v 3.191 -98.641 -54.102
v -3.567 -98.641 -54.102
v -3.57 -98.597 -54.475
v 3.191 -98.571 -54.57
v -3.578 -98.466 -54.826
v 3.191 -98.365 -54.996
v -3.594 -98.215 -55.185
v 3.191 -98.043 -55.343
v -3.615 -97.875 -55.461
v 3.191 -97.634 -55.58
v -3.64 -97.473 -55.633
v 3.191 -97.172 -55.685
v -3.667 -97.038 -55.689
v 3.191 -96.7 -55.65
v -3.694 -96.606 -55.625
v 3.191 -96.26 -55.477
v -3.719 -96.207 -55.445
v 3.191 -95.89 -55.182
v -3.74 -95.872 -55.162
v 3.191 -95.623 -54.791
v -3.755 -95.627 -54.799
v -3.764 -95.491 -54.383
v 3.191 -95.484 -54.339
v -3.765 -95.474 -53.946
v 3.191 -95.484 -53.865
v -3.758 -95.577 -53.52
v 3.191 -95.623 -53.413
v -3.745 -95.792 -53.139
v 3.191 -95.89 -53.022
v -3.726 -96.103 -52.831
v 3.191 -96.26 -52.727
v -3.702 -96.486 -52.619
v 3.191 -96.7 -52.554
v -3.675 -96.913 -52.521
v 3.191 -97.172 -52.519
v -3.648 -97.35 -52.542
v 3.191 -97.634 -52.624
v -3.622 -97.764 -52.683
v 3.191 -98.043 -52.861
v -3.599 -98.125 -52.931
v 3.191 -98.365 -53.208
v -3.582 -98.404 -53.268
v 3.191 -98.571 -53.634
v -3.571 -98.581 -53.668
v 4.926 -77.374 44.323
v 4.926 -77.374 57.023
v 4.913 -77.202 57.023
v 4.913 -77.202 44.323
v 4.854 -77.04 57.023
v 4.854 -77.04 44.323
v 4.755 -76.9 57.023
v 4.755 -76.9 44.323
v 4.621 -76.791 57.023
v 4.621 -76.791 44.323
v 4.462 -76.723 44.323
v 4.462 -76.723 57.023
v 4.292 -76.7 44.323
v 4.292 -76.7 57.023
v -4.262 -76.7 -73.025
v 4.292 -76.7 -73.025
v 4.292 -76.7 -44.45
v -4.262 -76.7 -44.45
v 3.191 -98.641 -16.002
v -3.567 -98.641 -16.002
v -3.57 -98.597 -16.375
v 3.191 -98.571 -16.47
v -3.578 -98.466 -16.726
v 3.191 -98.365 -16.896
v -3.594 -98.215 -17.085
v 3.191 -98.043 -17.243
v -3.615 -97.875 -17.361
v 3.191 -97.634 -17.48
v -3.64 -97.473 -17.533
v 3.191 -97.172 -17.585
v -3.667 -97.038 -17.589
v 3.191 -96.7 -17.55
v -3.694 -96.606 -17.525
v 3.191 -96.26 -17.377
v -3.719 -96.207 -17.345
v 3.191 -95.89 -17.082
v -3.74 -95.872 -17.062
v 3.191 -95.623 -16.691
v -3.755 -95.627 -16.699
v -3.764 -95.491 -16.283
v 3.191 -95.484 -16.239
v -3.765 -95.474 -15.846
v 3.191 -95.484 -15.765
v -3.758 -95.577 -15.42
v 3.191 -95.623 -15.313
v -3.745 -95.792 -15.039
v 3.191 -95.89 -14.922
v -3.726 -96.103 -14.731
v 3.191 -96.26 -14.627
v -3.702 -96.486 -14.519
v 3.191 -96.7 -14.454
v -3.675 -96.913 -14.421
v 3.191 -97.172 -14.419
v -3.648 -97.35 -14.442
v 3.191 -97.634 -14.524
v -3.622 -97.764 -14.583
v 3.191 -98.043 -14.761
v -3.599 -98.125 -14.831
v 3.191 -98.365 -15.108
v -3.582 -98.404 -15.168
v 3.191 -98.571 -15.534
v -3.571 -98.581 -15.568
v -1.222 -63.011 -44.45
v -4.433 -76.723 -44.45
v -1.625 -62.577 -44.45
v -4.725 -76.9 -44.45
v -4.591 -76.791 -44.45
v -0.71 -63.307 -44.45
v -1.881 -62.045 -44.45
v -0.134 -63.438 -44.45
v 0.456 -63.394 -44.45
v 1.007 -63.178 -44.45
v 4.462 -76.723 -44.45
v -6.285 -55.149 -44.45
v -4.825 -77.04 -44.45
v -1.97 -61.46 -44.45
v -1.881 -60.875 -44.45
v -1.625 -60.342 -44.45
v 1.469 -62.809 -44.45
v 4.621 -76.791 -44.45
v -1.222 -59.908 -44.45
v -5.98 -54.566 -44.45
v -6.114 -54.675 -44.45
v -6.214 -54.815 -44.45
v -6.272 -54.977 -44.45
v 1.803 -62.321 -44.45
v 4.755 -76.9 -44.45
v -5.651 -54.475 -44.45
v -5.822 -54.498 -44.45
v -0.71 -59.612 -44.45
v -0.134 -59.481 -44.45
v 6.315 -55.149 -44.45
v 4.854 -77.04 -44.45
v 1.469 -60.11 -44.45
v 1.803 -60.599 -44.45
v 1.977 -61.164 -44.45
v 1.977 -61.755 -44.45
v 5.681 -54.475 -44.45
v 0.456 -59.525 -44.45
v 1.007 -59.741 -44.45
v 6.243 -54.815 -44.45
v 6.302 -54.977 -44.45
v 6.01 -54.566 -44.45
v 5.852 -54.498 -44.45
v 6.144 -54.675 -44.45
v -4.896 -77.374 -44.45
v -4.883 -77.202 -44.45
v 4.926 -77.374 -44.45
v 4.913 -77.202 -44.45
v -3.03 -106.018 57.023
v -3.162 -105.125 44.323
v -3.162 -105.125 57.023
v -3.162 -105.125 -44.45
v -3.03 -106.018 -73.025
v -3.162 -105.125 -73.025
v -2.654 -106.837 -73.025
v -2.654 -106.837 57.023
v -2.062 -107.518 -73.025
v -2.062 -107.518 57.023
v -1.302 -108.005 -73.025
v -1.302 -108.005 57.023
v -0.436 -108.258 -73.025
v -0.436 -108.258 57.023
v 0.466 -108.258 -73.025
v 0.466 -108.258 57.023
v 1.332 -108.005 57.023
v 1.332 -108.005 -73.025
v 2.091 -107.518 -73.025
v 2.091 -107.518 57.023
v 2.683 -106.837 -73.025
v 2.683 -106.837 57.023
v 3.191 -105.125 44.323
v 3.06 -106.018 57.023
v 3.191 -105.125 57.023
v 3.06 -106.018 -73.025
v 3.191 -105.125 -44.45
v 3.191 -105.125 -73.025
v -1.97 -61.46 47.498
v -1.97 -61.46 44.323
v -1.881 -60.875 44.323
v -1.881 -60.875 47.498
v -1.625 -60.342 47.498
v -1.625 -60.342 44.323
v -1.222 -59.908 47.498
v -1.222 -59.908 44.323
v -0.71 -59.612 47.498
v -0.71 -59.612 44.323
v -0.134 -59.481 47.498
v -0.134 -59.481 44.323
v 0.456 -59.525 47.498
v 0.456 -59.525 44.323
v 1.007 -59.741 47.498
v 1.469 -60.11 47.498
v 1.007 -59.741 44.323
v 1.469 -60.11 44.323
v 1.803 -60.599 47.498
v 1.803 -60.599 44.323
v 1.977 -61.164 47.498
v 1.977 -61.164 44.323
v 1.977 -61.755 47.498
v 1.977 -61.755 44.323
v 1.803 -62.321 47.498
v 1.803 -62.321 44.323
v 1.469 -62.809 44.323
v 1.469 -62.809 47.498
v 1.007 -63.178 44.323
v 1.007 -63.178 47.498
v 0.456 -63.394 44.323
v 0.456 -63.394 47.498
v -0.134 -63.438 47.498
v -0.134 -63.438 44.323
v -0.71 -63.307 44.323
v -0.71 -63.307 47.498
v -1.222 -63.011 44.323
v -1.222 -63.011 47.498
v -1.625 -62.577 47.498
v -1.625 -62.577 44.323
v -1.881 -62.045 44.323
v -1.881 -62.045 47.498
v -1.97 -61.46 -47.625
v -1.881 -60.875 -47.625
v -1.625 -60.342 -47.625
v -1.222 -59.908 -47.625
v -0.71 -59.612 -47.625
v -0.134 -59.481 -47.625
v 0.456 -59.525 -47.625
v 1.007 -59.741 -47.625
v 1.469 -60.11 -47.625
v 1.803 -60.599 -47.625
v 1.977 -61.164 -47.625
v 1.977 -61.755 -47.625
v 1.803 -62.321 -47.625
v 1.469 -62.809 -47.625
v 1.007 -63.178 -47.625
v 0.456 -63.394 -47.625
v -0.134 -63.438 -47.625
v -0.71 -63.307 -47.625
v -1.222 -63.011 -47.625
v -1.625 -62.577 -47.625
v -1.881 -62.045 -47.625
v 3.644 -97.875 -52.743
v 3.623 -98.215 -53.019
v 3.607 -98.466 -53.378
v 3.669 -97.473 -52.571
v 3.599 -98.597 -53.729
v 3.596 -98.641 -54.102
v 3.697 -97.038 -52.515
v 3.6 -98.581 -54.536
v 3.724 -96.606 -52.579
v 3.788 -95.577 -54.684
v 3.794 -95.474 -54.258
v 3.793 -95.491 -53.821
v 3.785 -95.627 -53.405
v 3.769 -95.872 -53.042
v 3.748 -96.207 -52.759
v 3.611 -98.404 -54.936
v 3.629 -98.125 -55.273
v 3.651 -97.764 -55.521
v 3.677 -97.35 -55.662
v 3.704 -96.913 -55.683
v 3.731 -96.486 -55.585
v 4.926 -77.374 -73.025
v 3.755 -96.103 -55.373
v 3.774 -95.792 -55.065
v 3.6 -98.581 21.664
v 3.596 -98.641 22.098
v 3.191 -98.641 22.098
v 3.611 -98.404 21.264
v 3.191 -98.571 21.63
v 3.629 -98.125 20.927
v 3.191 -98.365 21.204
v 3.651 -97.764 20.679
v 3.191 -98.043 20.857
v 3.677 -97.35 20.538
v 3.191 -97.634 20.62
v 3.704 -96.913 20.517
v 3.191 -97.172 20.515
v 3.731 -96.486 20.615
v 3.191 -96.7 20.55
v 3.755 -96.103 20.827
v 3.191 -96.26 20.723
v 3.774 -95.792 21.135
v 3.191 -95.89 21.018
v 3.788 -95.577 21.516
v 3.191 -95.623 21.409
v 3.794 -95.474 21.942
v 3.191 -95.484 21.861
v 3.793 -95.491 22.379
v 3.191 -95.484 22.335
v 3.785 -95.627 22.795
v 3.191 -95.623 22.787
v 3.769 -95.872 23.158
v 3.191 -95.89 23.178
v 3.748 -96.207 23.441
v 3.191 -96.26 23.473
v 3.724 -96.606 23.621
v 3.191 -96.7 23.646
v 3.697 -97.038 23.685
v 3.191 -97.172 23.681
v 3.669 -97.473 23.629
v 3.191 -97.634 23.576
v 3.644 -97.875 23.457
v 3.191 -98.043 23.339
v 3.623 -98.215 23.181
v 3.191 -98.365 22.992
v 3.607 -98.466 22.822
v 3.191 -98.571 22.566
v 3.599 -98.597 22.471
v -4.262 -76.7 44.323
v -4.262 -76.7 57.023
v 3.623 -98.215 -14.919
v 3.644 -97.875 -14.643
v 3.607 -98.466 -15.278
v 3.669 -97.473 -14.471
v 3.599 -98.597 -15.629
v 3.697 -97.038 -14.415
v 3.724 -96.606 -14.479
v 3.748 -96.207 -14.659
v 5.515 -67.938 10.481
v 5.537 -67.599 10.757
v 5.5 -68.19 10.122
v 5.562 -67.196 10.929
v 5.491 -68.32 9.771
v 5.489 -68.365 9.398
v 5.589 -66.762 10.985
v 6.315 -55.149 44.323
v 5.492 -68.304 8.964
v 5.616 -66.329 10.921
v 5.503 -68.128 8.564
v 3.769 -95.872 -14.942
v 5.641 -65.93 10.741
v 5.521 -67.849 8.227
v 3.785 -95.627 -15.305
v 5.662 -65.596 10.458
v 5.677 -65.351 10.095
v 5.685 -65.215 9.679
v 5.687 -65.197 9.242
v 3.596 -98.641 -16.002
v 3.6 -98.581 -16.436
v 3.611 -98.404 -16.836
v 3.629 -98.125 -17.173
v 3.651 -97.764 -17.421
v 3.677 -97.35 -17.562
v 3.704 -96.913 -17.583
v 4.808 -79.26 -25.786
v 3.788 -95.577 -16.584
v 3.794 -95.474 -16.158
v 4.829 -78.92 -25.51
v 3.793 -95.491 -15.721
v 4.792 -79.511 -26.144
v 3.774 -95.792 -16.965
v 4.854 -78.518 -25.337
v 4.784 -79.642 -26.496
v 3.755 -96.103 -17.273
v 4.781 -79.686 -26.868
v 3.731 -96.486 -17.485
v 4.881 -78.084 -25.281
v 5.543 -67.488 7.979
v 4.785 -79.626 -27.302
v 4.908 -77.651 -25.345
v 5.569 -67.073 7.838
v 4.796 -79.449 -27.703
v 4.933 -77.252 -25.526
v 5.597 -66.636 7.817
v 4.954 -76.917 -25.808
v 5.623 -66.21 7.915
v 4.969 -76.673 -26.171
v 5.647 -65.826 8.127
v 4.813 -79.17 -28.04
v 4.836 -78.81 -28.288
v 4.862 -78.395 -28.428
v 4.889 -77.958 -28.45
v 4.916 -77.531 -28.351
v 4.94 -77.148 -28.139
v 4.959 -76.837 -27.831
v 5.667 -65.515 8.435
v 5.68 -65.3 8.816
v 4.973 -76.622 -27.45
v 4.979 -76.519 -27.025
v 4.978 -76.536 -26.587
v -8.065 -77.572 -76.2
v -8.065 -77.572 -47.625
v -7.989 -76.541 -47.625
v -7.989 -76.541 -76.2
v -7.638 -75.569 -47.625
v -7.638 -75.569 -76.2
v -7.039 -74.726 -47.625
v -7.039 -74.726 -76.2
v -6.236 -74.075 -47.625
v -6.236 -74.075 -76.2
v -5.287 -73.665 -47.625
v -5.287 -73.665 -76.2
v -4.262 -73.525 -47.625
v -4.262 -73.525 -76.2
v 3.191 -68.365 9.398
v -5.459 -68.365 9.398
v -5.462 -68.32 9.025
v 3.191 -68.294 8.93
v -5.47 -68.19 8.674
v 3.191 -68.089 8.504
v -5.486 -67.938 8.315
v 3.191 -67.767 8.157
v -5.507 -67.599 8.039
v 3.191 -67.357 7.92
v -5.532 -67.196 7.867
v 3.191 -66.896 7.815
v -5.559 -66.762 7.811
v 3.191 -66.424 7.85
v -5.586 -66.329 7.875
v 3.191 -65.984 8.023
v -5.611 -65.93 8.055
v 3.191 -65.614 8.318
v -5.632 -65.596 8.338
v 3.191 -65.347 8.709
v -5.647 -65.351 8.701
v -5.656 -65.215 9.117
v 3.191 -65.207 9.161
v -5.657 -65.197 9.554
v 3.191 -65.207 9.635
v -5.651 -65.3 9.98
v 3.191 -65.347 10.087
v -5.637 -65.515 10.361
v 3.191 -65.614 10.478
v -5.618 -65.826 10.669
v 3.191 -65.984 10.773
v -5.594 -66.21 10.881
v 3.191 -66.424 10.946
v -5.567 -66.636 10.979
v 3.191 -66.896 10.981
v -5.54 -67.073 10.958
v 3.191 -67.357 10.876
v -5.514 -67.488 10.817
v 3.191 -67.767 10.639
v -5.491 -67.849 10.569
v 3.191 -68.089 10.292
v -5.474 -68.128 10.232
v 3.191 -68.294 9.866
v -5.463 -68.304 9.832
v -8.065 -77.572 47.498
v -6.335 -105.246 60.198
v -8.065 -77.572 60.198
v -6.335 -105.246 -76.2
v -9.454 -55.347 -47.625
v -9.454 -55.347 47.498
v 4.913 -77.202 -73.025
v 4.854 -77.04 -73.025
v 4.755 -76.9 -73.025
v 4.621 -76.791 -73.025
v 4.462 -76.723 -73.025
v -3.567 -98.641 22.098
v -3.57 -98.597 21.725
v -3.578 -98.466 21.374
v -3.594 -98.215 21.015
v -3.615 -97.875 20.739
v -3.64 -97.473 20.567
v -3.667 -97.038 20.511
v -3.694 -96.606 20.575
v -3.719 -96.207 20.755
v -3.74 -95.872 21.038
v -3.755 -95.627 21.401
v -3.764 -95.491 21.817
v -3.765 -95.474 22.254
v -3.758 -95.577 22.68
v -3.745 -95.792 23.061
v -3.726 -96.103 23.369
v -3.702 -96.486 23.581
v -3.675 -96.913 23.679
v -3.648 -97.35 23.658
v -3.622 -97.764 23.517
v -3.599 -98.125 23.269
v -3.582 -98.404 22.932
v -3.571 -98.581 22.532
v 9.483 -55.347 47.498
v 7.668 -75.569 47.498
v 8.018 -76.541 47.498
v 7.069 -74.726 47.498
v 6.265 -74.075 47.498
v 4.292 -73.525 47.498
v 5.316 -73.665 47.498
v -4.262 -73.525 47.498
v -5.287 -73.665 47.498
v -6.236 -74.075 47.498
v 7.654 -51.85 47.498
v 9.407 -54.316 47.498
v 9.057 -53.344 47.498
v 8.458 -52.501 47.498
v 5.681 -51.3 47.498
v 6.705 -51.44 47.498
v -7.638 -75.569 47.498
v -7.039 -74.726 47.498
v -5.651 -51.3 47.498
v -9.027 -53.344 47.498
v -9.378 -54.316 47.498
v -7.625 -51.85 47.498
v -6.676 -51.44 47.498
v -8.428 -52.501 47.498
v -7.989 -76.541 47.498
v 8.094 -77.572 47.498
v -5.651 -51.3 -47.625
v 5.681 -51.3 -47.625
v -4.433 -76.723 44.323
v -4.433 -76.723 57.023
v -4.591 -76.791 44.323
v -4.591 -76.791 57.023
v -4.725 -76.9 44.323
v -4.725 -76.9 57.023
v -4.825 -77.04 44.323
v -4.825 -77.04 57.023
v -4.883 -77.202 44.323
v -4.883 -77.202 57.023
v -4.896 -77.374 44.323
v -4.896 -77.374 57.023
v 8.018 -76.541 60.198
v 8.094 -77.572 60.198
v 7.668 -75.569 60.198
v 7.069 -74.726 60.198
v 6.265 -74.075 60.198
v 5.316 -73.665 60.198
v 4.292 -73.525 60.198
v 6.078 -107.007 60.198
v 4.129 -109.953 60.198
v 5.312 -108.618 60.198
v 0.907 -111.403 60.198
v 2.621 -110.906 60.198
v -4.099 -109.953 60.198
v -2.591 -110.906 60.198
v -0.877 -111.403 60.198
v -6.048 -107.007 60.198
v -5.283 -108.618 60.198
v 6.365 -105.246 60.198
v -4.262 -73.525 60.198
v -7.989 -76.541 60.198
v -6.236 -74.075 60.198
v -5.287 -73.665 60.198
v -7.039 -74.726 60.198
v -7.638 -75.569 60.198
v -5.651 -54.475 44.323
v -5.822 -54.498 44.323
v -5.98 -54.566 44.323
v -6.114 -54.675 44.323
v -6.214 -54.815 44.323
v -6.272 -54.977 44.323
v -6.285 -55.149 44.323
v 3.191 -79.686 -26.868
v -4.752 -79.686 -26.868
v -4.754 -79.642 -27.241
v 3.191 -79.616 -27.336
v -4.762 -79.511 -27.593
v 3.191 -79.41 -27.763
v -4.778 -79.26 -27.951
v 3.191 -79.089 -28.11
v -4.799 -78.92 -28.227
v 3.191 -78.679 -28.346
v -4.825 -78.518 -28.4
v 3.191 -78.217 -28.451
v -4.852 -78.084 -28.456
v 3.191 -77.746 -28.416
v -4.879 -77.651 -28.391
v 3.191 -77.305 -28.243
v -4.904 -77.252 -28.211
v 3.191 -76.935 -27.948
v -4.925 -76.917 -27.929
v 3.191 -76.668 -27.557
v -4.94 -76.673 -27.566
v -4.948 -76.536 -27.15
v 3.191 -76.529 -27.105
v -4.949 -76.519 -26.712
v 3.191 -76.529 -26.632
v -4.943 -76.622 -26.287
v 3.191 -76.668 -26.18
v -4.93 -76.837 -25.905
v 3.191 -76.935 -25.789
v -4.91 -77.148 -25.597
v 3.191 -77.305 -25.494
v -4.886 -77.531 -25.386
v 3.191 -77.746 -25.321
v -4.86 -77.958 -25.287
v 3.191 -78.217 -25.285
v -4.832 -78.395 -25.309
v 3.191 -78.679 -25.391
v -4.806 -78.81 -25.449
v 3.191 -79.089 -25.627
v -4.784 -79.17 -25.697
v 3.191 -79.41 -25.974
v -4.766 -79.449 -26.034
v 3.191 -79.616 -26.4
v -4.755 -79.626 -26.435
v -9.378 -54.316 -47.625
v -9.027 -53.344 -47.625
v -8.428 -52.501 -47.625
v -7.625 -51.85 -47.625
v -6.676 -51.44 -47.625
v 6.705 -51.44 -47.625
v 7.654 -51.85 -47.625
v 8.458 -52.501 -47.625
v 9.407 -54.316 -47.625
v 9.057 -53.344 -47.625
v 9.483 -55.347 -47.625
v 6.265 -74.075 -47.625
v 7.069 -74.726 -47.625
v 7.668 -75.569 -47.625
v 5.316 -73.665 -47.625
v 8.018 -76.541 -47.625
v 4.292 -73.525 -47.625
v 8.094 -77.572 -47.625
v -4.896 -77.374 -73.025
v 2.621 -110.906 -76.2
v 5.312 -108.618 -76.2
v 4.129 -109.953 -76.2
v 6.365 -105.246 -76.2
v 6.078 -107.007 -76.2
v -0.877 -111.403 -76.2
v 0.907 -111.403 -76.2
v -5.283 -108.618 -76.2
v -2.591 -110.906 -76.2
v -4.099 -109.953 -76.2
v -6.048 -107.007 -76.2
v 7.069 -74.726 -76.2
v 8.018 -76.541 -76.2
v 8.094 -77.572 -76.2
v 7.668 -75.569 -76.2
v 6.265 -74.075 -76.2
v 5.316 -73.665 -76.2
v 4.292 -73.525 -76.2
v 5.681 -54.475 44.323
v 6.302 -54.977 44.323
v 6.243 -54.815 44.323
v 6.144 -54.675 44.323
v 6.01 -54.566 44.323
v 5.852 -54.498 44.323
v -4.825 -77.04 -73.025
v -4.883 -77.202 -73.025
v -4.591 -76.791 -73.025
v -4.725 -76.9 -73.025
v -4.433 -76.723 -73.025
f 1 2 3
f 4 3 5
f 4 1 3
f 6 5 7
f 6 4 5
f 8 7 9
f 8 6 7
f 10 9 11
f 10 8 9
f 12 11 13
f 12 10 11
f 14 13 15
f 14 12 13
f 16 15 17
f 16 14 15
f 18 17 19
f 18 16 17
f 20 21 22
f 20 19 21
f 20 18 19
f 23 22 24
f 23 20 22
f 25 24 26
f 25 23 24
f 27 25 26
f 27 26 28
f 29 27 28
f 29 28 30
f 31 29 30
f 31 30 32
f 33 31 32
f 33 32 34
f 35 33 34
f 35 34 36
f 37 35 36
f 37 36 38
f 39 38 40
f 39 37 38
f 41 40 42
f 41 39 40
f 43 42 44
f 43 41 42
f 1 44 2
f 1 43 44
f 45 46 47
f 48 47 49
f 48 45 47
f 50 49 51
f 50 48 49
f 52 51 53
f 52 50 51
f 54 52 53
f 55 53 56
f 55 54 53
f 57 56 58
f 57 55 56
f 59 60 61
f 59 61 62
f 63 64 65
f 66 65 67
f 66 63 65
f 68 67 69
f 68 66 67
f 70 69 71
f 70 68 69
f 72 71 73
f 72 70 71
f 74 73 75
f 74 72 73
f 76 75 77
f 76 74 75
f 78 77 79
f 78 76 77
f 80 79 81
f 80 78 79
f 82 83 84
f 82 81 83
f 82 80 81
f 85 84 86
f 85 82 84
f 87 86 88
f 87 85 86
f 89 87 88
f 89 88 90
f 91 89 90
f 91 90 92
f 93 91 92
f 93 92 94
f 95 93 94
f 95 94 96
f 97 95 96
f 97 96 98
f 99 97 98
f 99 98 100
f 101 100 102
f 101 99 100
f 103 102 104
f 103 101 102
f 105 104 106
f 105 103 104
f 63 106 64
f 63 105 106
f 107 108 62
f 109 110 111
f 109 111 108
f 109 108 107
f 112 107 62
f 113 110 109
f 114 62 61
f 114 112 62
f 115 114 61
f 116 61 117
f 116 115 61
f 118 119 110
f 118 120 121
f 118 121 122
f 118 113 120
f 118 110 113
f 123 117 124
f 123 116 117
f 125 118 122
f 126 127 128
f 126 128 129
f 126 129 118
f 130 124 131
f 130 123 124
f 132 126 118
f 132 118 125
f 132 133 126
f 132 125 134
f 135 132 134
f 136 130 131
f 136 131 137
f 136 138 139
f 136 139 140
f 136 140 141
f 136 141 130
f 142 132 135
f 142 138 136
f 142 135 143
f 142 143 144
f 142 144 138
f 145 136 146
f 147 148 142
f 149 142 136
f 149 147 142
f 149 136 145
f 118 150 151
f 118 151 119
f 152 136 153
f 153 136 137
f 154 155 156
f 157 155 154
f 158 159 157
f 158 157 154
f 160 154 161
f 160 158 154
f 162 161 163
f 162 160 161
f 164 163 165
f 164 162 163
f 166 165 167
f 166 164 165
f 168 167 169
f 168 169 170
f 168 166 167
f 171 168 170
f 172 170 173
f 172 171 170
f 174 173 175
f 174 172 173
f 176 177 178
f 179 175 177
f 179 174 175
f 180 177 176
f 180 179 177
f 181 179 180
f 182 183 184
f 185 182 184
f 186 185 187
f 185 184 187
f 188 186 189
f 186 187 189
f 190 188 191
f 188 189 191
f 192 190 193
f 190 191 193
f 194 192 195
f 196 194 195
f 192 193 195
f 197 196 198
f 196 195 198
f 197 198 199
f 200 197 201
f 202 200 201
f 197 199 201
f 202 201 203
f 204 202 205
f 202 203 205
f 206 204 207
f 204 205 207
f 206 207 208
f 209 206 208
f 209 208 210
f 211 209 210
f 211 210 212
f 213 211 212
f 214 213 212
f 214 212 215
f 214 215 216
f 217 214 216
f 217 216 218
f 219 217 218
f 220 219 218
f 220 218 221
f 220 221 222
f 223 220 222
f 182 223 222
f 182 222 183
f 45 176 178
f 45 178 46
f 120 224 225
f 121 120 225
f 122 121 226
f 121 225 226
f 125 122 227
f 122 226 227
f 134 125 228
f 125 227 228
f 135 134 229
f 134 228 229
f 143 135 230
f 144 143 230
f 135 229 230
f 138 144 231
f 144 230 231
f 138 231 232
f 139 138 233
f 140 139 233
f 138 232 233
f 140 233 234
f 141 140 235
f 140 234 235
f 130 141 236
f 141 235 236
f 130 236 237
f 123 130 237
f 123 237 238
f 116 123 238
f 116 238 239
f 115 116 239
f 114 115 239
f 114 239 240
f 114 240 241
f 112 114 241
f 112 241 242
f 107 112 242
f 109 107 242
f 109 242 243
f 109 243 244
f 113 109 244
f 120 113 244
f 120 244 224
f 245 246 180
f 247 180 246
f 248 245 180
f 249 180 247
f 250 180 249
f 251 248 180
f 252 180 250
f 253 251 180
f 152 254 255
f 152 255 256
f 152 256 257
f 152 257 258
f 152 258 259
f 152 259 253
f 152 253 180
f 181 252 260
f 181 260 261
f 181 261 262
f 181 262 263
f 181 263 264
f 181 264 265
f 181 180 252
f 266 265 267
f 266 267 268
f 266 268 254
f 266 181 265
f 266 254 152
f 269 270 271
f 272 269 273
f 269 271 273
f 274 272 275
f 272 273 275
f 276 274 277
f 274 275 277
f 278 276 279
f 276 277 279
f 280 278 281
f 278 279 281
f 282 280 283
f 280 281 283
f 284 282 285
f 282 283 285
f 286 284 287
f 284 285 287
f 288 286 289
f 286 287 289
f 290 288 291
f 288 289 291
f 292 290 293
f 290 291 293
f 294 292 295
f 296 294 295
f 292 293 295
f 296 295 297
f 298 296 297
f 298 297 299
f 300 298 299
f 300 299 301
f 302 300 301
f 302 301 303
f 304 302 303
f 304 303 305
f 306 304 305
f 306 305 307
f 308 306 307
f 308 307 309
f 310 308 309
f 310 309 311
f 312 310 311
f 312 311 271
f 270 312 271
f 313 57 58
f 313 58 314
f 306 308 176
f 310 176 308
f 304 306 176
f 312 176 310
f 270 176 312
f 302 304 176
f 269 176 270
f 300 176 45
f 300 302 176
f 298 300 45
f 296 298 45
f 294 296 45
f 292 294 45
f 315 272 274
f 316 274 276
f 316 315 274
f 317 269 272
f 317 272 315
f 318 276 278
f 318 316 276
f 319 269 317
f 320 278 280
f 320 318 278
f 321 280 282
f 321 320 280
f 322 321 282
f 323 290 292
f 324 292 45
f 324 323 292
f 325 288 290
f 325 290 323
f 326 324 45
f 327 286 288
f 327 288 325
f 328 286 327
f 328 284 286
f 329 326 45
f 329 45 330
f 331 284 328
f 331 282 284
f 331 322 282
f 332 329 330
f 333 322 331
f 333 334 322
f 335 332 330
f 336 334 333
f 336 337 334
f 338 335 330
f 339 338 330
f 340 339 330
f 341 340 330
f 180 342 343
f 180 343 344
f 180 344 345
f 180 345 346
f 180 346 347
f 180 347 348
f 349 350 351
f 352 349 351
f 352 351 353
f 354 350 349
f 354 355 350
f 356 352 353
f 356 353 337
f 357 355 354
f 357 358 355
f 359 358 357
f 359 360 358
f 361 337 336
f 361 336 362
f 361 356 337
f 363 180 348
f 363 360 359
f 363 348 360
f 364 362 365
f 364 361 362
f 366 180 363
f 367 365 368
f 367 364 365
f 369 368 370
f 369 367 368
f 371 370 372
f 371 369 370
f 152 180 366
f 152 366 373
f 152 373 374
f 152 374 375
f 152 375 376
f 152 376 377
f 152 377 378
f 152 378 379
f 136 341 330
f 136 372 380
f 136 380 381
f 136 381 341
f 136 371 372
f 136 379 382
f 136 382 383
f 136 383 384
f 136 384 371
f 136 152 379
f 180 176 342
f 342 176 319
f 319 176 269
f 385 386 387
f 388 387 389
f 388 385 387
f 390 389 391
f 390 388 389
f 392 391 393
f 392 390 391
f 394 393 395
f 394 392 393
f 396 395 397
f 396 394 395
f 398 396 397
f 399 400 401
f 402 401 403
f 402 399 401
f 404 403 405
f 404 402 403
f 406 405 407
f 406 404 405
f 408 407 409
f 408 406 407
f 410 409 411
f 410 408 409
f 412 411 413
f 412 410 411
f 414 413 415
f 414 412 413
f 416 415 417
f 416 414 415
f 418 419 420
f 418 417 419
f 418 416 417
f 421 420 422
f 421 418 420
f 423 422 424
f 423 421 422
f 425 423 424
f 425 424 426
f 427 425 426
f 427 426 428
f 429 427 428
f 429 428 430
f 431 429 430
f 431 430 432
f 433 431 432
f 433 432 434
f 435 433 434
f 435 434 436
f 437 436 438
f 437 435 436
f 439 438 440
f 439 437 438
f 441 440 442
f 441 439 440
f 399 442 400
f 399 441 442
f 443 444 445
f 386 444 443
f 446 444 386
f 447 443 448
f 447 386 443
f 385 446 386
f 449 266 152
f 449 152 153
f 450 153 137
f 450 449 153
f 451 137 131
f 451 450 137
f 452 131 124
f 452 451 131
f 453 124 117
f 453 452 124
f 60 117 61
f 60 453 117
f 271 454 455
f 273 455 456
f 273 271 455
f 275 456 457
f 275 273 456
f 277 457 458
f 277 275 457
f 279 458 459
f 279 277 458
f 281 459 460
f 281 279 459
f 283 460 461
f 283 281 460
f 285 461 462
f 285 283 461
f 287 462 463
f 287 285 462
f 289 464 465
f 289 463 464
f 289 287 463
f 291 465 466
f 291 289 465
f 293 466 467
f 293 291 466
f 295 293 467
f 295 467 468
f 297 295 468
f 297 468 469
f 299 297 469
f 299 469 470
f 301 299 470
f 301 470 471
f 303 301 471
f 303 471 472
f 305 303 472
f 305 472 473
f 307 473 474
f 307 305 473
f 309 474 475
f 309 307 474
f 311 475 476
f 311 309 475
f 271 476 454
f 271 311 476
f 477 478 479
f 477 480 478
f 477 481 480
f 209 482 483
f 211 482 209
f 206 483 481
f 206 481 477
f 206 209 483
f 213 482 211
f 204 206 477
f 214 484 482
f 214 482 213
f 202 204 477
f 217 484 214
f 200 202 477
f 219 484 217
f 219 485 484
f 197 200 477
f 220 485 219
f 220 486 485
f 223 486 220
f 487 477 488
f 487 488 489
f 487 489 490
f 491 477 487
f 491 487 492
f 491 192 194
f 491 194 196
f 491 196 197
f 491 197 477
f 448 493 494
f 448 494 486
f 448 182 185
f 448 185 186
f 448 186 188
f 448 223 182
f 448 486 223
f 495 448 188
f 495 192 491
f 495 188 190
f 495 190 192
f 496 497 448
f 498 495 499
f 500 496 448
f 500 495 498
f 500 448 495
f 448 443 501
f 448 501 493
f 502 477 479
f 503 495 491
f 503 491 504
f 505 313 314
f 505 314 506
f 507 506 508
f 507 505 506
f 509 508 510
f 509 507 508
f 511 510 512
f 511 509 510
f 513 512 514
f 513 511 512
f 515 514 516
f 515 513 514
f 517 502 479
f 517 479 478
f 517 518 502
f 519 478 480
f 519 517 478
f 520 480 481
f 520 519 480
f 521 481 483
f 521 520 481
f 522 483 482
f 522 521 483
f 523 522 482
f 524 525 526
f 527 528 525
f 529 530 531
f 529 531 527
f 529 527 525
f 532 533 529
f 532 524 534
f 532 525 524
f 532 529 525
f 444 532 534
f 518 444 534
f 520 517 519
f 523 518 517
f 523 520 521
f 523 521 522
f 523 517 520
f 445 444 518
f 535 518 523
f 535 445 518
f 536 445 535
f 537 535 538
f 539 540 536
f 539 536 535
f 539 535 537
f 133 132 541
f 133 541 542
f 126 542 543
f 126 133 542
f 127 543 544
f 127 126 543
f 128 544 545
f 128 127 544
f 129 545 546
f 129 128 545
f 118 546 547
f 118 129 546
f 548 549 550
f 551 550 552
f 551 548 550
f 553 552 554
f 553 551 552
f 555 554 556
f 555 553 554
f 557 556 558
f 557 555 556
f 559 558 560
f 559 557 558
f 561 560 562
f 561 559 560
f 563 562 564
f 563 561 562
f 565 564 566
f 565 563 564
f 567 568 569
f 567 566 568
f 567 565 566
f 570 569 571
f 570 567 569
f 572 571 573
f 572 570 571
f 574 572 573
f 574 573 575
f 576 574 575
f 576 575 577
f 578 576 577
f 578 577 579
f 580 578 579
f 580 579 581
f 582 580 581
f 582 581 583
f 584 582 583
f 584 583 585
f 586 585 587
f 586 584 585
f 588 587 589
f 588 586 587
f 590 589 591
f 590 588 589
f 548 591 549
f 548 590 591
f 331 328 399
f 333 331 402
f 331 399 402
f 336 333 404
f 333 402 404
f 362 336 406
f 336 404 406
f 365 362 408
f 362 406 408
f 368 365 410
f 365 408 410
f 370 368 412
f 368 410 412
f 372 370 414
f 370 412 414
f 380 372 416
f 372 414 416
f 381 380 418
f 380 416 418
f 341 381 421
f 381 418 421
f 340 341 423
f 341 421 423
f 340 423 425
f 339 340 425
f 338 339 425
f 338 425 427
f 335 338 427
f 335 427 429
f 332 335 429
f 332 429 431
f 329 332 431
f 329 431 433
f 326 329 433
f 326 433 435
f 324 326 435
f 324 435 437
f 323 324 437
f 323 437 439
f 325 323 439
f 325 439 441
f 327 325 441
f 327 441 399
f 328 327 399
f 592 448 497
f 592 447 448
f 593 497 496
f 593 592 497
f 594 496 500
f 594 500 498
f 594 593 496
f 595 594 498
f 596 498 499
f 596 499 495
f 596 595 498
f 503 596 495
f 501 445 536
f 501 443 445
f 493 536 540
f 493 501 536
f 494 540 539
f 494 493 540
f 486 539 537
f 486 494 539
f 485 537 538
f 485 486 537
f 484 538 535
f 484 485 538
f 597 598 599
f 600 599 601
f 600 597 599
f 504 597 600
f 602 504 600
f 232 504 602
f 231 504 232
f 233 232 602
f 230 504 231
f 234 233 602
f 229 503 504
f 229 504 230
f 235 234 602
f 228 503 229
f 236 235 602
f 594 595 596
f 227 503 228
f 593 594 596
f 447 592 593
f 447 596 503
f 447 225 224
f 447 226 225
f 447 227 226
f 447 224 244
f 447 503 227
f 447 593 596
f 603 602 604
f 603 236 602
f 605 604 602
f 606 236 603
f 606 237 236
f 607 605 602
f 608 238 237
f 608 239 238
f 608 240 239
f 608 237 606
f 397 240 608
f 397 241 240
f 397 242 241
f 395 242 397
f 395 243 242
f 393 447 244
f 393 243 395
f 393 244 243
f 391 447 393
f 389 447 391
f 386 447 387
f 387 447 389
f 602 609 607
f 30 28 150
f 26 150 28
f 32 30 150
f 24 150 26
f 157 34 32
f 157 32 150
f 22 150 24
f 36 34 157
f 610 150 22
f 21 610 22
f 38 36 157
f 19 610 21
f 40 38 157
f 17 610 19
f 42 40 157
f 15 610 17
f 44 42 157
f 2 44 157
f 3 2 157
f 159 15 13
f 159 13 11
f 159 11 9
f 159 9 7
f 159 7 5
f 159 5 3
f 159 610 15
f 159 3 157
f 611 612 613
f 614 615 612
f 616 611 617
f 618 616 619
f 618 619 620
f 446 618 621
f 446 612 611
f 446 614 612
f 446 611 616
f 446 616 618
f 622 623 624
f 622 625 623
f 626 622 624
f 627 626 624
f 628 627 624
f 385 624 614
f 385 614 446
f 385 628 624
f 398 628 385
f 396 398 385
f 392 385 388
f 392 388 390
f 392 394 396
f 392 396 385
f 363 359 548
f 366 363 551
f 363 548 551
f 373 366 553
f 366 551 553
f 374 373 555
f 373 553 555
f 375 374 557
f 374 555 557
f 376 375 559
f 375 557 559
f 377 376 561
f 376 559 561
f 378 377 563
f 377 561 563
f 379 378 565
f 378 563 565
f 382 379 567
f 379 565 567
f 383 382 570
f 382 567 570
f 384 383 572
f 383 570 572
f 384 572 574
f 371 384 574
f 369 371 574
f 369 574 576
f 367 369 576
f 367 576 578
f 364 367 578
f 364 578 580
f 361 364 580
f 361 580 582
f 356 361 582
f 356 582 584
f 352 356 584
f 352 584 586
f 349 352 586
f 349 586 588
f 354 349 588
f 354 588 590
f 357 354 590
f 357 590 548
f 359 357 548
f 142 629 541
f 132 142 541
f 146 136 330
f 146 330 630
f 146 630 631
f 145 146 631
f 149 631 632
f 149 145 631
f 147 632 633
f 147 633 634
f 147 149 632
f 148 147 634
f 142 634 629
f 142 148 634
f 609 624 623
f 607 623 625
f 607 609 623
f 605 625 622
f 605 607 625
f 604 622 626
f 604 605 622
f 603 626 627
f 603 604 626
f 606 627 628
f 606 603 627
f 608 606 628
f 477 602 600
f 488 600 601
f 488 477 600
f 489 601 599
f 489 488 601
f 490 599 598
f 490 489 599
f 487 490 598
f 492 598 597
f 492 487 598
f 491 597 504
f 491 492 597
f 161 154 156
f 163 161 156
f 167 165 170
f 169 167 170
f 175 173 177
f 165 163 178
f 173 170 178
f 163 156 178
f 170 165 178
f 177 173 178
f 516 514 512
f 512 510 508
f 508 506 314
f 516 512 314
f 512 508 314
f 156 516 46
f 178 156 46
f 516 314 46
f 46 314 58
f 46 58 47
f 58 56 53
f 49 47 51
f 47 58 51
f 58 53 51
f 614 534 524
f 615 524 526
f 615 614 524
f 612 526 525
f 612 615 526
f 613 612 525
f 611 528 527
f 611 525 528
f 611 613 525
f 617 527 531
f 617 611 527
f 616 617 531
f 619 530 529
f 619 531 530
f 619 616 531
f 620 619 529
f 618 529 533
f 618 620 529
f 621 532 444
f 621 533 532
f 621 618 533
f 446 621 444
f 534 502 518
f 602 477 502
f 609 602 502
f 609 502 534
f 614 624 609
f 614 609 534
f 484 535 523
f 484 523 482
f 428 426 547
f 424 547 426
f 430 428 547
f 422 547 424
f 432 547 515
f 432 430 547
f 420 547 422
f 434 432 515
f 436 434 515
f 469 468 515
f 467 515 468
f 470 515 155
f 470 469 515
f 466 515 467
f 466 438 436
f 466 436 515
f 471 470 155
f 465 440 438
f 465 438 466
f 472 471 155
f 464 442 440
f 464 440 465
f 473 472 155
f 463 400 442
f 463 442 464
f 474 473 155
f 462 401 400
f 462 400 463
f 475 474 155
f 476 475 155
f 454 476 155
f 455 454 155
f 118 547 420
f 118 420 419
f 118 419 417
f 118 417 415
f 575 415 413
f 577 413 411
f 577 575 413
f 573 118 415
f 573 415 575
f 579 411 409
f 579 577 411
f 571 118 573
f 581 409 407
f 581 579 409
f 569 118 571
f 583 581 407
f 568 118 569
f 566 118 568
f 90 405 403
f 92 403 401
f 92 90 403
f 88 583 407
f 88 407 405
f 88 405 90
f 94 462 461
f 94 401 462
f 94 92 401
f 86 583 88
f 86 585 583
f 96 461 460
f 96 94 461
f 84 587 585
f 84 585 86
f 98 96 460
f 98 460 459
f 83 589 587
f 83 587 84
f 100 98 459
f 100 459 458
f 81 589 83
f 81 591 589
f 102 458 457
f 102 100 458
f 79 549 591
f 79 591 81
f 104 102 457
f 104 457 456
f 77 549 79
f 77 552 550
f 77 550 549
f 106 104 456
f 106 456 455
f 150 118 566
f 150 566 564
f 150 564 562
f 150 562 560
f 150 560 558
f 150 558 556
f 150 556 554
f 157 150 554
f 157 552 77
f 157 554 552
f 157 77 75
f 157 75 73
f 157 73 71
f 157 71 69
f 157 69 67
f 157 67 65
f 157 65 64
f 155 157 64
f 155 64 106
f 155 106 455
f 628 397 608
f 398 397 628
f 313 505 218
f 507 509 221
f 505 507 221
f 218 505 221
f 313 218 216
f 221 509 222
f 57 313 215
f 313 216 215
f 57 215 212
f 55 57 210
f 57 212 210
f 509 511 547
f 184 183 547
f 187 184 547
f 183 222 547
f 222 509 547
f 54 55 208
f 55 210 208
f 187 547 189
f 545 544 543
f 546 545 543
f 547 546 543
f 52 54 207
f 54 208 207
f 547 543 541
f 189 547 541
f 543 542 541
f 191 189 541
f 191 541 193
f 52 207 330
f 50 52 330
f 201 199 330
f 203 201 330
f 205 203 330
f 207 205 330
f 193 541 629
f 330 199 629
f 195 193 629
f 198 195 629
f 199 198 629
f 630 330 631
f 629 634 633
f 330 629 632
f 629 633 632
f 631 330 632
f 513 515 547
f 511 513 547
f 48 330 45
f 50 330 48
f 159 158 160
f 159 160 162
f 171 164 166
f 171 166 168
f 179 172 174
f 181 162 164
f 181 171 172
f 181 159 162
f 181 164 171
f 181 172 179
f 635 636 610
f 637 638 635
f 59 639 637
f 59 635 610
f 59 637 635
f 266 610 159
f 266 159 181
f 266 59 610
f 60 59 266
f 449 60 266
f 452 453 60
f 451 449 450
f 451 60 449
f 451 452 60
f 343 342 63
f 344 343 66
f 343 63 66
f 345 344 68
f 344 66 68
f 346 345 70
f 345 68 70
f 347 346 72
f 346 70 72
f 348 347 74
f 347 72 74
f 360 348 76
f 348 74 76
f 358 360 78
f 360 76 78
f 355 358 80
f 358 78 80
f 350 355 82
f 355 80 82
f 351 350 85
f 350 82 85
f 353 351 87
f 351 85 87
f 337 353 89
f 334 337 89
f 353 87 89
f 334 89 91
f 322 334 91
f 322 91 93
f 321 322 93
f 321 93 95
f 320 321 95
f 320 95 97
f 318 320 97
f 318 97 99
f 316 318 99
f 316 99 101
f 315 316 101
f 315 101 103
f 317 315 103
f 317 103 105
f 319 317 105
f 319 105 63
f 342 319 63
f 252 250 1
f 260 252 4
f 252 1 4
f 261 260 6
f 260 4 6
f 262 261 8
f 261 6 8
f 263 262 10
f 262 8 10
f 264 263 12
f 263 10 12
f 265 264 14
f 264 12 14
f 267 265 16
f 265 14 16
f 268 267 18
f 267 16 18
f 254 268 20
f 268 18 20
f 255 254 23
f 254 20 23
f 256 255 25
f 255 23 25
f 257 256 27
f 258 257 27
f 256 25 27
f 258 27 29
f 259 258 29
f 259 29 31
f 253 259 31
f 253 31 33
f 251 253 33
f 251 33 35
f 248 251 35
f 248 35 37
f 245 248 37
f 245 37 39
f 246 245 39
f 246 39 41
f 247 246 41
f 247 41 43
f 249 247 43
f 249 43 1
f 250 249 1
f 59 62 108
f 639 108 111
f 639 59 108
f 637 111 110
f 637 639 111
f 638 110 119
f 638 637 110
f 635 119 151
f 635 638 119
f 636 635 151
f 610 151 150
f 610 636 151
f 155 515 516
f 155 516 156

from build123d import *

# Parameters (mm, degrees)
BOSS_EXTRUDE1_DEPTH             = 76.2
BOSS_EXTRUDE1_DEPTH_BACK        = 76.2
CUT_EXTRUDE1_DEPTH              = 136.619651209
CUT_EXTRUDE1_DEPTH_BACK         = 136.619651209
FILLET1_R                       = 3.81
SHELL1_START                    = -44.45
SHELL1_DEPTH                    = 88.773
SHELL1_START_2                  = -73.025
SHELL1_2_DEPTH                  = 130.048
SKETCH14_R                      = 1.984375
CUT_EXTRUDE8_DEPTH              = 156.372005628
BOSS_EXTRUDE4_REACH             = 137.201
SKETCH15_R                      = 1.5875
BOSS_EXTRUDE4_DIRECTION_2_REACH = 137.201


# Read off the part's stored shape, not the designer's step: Shell1
with BuildPart() as part:
    # Sketch1 → Boss-Extrude1 (new, two sides: drawn at the far end of the back side and taken through both)
    with BuildSketch(Plane.XY.offset(-BOSS_EXTRUDE1_DEPTH_BACK)):
        with BuildLine():
            Line((-6.335258536, -105.245804705), (-12.685258536, -3.645804705))
            ThreePointArc((-12.685258536, -3.645804705), (0.014741464, 8.866413132), (12.714741464, -3.645804705))
            Line((12.714741464, -3.645804705), (6.364741464, -105.245804705))
            ThreePointArc((6.364741464, -105.245804705), (0.014741464, -111.465623147), (-6.335258536, -105.245804705))
        make_face()
    extrude(amount=BOSS_EXTRUDE1_DEPTH + BOSS_EXTRUDE1_DEPTH_BACK)

    # Sketch4 → Cut-Extrude1 (cut, two sides: drawn at the far end of the back side and taken through both)
    with BuildSketch(Plane(origin=(0, 0, 0), x_dir=(0, 0, -1), z_dir=(1, 0, 0)).offset(-CUT_EXTRUDE1_DEPTH_BACK)):
        Polygon((-47.498, -73.524605007), (-47.498, -51.299605007), (47.625, -51.299605007), (47.625, -73.524605007), (76.2, -73.524605007), (76.2, 8.866413132), (-76.2, 8.866413132), (-76.2, -28.682279346), (-76.2, -111.465623147), (-60.198, -111.465623147), (-60.198, -73.524605007), align=None)
    extrude(amount=CUT_EXTRUDE1_DEPTH + CUT_EXTRUDE1_DEPTH_BACK, mode=Mode.SUBTRACT)

    # Fillet1
    fillet1_edges = [part.edges().sort_by_distance(p)[0] for p in [
        (8.347316445, -73.524605007, 53.848),
        (9.736378945, -51.299605007, -0.0635),
        (-9.706896017, -51.299605007, -0.0635),
        (-8.317833517, -73.524605007, 53.848),
        (-8.317833517, -73.524605007, -61.9125),
        (8.347316445, -73.524605007, -61.9125),
    ]]
    fillet(fillet1_edges, radius=FILLET1_R)

    # Shell1 outline → Shell1 (cut)
    with BuildSketch(Plane.XY.offset(SHELL1_START)):
        with BuildLine():
            ThreePointArc((-3.161602106, -105.125185529), (0.014741465, -108.290623147), (3.191085035, -105.125185529))
            Line((3.191085035, -105.125185529), (6.314583179, -55.149215219))
            ThreePointArc((6.314583179, -55.149215219), (6.143625088, -54.674822007), (5.680819792, -54.474605007))
            Line((5.680819792, -54.474605007), (-5.651336863, -54.474605007))
            ThreePointArc((-5.651336863, -54.474605007), (-6.114142159, -54.674822006), (-6.285100251, -55.149215219))
            Line((-6.285100251, -55.149215219), (-3.161602106, -105.125185529))
        make_face()
    extrude(amount=SHELL1_DEPTH, mode=Mode.SUBTRACT)

    # Shell1 2 outline → Shell1 2 (cut)
    with BuildSketch(Plane.XY.offset(SHELL1_START_2)):
        with BuildLine():
            Line((-4.896037751, -77.374215219), (-3.161602106, -105.125185529))
            ThreePointArc((-3.161602106, -105.125185529), (0.014741465, -108.290623147), (3.191085035, -105.125185529))
            Line((3.191085035, -105.125185529), (4.925520679, -77.374215219))
            ThreePointArc((4.925520679, -77.374215219), (4.754562588, -76.899822007), (4.291757292, -76.699605007))
            Line((4.291757292, -76.699605007), (-4.262274363, -76.699605007))
            ThreePointArc((-4.262274363, -76.699605007), (-4.725079659, -76.899822006), (-4.896037751, -77.374215219))
        make_face()
    extrude(amount=SHELL1_2_DEPTH, mode=Mode.SUBTRACT)

    # Sketch14 → Cut-Extrude8 (cut, through all)
    with BuildSketch(Plane(origin=(0, 0, -47.625), x_dir=(-1, 0, 0), z_dir=(0, 0, -1))):
        with Locations((-0.014741464, -61.459605007)):
            Circle(SKETCH14_R)
    extrude(amount=-CUT_EXTRUDE8_DEPTH, mode=Mode.SUBTRACT)

    # Boss-Extrude4: up to this plane
    boss_extrude4_end = Plane(origin=(3.195924528, -105.047753647, -76.2), z_dir=(0.9980525784828886, -0.062378286155180485, 0))
    # Sketch15 → Boss-Extrude4 (add, up to the surface)
    with BuildSketch(Plane(origin=(3.191103822, -0.502900096, 0), x_dir=(0, 0, -1), z_dir=(1, 0, 0)), mode=Mode.PRIVATE) as boss_extrude4_sk1:
        with Locations(Location((-9.398, -66.274366182, 0), (0, 0, 270))):
            Circle(SKETCH15_R)
    boss_extrude4_tool1 = split(extrude(boss_extrude4_sk1.sketch, amount=BOSS_EXTRUDE4_REACH, mode=Mode.PRIVATE), bisect_by=boss_extrude4_end, keep=Keep.BOTH, mode=Mode.PRIVATE)
    add(boss_extrude4_tool1.solids().sort_by_distance((3.191104, -66.777266, 9.398))[0])
    # Sketch15 → Boss-Extrude4 (add, up to the surface)
    with BuildSketch(Plane(origin=(3.191103822, -0.502900096, 0), x_dir=(0, 0, -1), z_dir=(1, 0, 0)), mode=Mode.PRIVATE) as boss_extrude4_sk2:
        with Locations(Location((26.868345804, -77.595887652, 0), (0, 0, 270))):
            Circle(SKETCH15_R)
    boss_extrude4_tool2 = split(extrude(boss_extrude4_sk2.sketch, amount=BOSS_EXTRUDE4_REACH, mode=Mode.PRIVATE), bisect_by=boss_extrude4_end, keep=Keep.BOTH, mode=Mode.PRIVATE)
    add(boss_extrude4_tool2.solids().sort_by_distance((3.191104, -78.098788, -26.868346))[0])
    # Sketch15 → Boss-Extrude4 (add, up to the surface)
    with BuildSketch(Plane(origin=(3.191103822, -0.502900096, 0), x_dir=(0, 0, -1), z_dir=(1, 0, 0)), mode=Mode.PRIVATE) as boss_extrude4_sk3:
        with Locations(Location((-22.098, -96.55076585, 0), (0, 0, 270))):
            Circle(SKETCH15_R)
    boss_extrude4_tool3 = split(extrude(boss_extrude4_sk3.sketch, amount=BOSS_EXTRUDE4_REACH, mode=Mode.PRIVATE), bisect_by=boss_extrude4_end, keep=Keep.BOTH, mode=Mode.PRIVATE)
    add(boss_extrude4_tool3.solids().sort_by_distance((3.191104, -97.053666, 22.098))[0])
    # Sketch15 → Boss-Extrude4 (add, up to the surface)
    with BuildSketch(Plane(origin=(3.191103822, -0.502900096, 0), x_dir=(0, 0, -1), z_dir=(1, 0, 0)), mode=Mode.PRIVATE) as boss_extrude4_sk4:
        with Locations(Location((16.002, -96.55076585, 0), (0, 0, 270))):
            Circle(SKETCH15_R)
    boss_extrude4_tool4 = split(extrude(boss_extrude4_sk4.sketch, amount=BOSS_EXTRUDE4_REACH, mode=Mode.PRIVATE), bisect_by=boss_extrude4_end, keep=Keep.BOTH, mode=Mode.PRIVATE)
    add(boss_extrude4_tool4.solids().sort_by_distance((3.191104, -97.053666, -16.002))[0])
    # Sketch15 → Boss-Extrude4 (add, up to the surface)
    with BuildSketch(Plane(origin=(3.191103822, -0.502900096, 0), x_dir=(0, 0, -1), z_dir=(1, 0, 0)), mode=Mode.PRIVATE) as boss_extrude4_sk5:
        with Locations(Location((54.102, -96.55076585, 0), (0, 0, 270))):
            Circle(SKETCH15_R)
    boss_extrude4_tool5 = split(extrude(boss_extrude4_sk5.sketch, amount=BOSS_EXTRUDE4_REACH, mode=Mode.PRIVATE), bisect_by=boss_extrude4_end, keep=Keep.BOTH, mode=Mode.PRIVATE)
    add(boss_extrude4_tool5.solids().sort_by_distance((3.191104, -97.053666, -54.102))[0])

    # Boss-Extrude4 direction 2: up to this plane
    boss_extrude4_direction_2_end = Plane(origin=(-3.166441599, -105.047753647, -76.2), z_dir=(-0.9980525784828886, -0.0623782861551806, 0))
    # Sketch15 → Boss-Extrude4 direction 2 (add, up to the surface)
    with BuildSketch(Plane(origin=(3.191103822, -0.502900096, 0), x_dir=(0, 0, -1), z_dir=(1, 0, 0)), mode=Mode.PRIVATE) as boss_extrude4_direction_2_sk1:
        with Locations(Location((-9.398, -66.274366182, 0), (0, 0, 270))):
            Circle(SKETCH15_R)
    boss_extrude4_direction_2_tool1 = split(extrude(boss_extrude4_direction_2_sk1.sketch, amount=-BOSS_EXTRUDE4_DIRECTION_2_REACH, mode=Mode.PRIVATE), bisect_by=boss_extrude4_direction_2_end, keep=Keep.BOTH, mode=Mode.PRIVATE)
    add(boss_extrude4_direction_2_tool1.solids().sort_by_distance((3.191104, -66.777266, 9.398))[0])
    # Sketch15 → Boss-Extrude4 direction 2 (add, up to the surface)
    with BuildSketch(Plane(origin=(3.191103822, -0.502900096, 0), x_dir=(0, 0, -1), z_dir=(1, 0, 0)), mode=Mode.PRIVATE) as boss_extrude4_direction_2_sk2:
        with Locations(Location((26.868345804, -77.595887652, 0), (0, 0, 270))):
            Circle(SKETCH15_R)
    boss_extrude4_direction_2_tool2 = split(extrude(boss_extrude4_direction_2_sk2.sketch, amount=-BOSS_EXTRUDE4_DIRECTION_2_REACH, mode=Mode.PRIVATE), bisect_by=boss_extrude4_direction_2_end, keep=Keep.BOTH, mode=Mode.PRIVATE)
    add(boss_extrude4_direction_2_tool2.solids().sort_by_distance((3.191104, -78.098788, -26.868346))[0])
    # Sketch15 → Boss-Extrude4 direction 2 (add, up to the surface)
    with BuildSketch(Plane(origin=(3.191103822, -0.502900096, 0), x_dir=(0, 0, -1), z_dir=(1, 0, 0)), mode=Mode.PRIVATE) as boss_extrude4_direction_2_sk3:
        with Locations(Location((-22.098, -96.55076585, 0), (0, 0, 270))):
            Circle(SKETCH15_R)
    boss_extrude4_direction_2_tool3 = split(extrude(boss_extrude4_direction_2_sk3.sketch, amount=-BOSS_EXTRUDE4_DIRECTION_2_REACH, mode=Mode.PRIVATE), bisect_by=boss_extrude4_direction_2_end, keep=Keep.BOTH, mode=Mode.PRIVATE)
    add(boss_extrude4_direction_2_tool3.solids().sort_by_distance((3.191104, -97.053666, 22.098))[0])
    # Sketch15 → Boss-Extrude4 direction 2 (add, up to the surface)
    with BuildSketch(Plane(origin=(3.191103822, -0.502900096, 0), x_dir=(0, 0, -1), z_dir=(1, 0, 0)), mode=Mode.PRIVATE) as boss_extrude4_direction_2_sk4:
        with Locations(Location((16.002, -96.55076585, 0), (0, 0, 270))):
            Circle(SKETCH15_R)
    boss_extrude4_direction_2_tool4 = split(extrude(boss_extrude4_direction_2_sk4.sketch, amount=-BOSS_EXTRUDE4_DIRECTION_2_REACH, mode=Mode.PRIVATE), bisect_by=boss_extrude4_direction_2_end, keep=Keep.BOTH, mode=Mode.PRIVATE)
    add(boss_extrude4_direction_2_tool4.solids().sort_by_distance((3.191104, -97.053666, -16.002))[0])
    # Sketch15 → Boss-Extrude4 direction 2 (add, up to the surface)
    with BuildSketch(Plane(origin=(3.191103822, -0.502900096, 0), x_dir=(0, 0, -1), z_dir=(1, 0, 0)), mode=Mode.PRIVATE) as boss_extrude4_direction_2_sk5:
        with Locations(Location((54.102, -96.55076585, 0), (0, 0, 270))):
            Circle(SKETCH15_R)
    boss_extrude4_direction_2_tool5 = split(extrude(boss_extrude4_direction_2_sk5.sketch, amount=-BOSS_EXTRUDE4_DIRECTION_2_REACH, mode=Mode.PRIVATE), bisect_by=boss_extrude4_direction_2_end, keep=Keep.BOTH, mode=Mode.PRIVATE)
    add(boss_extrude4_direction_2_tool5.solids().sort_by_distance((3.191104, -97.053666, -54.102))[0])


solid = part.part
